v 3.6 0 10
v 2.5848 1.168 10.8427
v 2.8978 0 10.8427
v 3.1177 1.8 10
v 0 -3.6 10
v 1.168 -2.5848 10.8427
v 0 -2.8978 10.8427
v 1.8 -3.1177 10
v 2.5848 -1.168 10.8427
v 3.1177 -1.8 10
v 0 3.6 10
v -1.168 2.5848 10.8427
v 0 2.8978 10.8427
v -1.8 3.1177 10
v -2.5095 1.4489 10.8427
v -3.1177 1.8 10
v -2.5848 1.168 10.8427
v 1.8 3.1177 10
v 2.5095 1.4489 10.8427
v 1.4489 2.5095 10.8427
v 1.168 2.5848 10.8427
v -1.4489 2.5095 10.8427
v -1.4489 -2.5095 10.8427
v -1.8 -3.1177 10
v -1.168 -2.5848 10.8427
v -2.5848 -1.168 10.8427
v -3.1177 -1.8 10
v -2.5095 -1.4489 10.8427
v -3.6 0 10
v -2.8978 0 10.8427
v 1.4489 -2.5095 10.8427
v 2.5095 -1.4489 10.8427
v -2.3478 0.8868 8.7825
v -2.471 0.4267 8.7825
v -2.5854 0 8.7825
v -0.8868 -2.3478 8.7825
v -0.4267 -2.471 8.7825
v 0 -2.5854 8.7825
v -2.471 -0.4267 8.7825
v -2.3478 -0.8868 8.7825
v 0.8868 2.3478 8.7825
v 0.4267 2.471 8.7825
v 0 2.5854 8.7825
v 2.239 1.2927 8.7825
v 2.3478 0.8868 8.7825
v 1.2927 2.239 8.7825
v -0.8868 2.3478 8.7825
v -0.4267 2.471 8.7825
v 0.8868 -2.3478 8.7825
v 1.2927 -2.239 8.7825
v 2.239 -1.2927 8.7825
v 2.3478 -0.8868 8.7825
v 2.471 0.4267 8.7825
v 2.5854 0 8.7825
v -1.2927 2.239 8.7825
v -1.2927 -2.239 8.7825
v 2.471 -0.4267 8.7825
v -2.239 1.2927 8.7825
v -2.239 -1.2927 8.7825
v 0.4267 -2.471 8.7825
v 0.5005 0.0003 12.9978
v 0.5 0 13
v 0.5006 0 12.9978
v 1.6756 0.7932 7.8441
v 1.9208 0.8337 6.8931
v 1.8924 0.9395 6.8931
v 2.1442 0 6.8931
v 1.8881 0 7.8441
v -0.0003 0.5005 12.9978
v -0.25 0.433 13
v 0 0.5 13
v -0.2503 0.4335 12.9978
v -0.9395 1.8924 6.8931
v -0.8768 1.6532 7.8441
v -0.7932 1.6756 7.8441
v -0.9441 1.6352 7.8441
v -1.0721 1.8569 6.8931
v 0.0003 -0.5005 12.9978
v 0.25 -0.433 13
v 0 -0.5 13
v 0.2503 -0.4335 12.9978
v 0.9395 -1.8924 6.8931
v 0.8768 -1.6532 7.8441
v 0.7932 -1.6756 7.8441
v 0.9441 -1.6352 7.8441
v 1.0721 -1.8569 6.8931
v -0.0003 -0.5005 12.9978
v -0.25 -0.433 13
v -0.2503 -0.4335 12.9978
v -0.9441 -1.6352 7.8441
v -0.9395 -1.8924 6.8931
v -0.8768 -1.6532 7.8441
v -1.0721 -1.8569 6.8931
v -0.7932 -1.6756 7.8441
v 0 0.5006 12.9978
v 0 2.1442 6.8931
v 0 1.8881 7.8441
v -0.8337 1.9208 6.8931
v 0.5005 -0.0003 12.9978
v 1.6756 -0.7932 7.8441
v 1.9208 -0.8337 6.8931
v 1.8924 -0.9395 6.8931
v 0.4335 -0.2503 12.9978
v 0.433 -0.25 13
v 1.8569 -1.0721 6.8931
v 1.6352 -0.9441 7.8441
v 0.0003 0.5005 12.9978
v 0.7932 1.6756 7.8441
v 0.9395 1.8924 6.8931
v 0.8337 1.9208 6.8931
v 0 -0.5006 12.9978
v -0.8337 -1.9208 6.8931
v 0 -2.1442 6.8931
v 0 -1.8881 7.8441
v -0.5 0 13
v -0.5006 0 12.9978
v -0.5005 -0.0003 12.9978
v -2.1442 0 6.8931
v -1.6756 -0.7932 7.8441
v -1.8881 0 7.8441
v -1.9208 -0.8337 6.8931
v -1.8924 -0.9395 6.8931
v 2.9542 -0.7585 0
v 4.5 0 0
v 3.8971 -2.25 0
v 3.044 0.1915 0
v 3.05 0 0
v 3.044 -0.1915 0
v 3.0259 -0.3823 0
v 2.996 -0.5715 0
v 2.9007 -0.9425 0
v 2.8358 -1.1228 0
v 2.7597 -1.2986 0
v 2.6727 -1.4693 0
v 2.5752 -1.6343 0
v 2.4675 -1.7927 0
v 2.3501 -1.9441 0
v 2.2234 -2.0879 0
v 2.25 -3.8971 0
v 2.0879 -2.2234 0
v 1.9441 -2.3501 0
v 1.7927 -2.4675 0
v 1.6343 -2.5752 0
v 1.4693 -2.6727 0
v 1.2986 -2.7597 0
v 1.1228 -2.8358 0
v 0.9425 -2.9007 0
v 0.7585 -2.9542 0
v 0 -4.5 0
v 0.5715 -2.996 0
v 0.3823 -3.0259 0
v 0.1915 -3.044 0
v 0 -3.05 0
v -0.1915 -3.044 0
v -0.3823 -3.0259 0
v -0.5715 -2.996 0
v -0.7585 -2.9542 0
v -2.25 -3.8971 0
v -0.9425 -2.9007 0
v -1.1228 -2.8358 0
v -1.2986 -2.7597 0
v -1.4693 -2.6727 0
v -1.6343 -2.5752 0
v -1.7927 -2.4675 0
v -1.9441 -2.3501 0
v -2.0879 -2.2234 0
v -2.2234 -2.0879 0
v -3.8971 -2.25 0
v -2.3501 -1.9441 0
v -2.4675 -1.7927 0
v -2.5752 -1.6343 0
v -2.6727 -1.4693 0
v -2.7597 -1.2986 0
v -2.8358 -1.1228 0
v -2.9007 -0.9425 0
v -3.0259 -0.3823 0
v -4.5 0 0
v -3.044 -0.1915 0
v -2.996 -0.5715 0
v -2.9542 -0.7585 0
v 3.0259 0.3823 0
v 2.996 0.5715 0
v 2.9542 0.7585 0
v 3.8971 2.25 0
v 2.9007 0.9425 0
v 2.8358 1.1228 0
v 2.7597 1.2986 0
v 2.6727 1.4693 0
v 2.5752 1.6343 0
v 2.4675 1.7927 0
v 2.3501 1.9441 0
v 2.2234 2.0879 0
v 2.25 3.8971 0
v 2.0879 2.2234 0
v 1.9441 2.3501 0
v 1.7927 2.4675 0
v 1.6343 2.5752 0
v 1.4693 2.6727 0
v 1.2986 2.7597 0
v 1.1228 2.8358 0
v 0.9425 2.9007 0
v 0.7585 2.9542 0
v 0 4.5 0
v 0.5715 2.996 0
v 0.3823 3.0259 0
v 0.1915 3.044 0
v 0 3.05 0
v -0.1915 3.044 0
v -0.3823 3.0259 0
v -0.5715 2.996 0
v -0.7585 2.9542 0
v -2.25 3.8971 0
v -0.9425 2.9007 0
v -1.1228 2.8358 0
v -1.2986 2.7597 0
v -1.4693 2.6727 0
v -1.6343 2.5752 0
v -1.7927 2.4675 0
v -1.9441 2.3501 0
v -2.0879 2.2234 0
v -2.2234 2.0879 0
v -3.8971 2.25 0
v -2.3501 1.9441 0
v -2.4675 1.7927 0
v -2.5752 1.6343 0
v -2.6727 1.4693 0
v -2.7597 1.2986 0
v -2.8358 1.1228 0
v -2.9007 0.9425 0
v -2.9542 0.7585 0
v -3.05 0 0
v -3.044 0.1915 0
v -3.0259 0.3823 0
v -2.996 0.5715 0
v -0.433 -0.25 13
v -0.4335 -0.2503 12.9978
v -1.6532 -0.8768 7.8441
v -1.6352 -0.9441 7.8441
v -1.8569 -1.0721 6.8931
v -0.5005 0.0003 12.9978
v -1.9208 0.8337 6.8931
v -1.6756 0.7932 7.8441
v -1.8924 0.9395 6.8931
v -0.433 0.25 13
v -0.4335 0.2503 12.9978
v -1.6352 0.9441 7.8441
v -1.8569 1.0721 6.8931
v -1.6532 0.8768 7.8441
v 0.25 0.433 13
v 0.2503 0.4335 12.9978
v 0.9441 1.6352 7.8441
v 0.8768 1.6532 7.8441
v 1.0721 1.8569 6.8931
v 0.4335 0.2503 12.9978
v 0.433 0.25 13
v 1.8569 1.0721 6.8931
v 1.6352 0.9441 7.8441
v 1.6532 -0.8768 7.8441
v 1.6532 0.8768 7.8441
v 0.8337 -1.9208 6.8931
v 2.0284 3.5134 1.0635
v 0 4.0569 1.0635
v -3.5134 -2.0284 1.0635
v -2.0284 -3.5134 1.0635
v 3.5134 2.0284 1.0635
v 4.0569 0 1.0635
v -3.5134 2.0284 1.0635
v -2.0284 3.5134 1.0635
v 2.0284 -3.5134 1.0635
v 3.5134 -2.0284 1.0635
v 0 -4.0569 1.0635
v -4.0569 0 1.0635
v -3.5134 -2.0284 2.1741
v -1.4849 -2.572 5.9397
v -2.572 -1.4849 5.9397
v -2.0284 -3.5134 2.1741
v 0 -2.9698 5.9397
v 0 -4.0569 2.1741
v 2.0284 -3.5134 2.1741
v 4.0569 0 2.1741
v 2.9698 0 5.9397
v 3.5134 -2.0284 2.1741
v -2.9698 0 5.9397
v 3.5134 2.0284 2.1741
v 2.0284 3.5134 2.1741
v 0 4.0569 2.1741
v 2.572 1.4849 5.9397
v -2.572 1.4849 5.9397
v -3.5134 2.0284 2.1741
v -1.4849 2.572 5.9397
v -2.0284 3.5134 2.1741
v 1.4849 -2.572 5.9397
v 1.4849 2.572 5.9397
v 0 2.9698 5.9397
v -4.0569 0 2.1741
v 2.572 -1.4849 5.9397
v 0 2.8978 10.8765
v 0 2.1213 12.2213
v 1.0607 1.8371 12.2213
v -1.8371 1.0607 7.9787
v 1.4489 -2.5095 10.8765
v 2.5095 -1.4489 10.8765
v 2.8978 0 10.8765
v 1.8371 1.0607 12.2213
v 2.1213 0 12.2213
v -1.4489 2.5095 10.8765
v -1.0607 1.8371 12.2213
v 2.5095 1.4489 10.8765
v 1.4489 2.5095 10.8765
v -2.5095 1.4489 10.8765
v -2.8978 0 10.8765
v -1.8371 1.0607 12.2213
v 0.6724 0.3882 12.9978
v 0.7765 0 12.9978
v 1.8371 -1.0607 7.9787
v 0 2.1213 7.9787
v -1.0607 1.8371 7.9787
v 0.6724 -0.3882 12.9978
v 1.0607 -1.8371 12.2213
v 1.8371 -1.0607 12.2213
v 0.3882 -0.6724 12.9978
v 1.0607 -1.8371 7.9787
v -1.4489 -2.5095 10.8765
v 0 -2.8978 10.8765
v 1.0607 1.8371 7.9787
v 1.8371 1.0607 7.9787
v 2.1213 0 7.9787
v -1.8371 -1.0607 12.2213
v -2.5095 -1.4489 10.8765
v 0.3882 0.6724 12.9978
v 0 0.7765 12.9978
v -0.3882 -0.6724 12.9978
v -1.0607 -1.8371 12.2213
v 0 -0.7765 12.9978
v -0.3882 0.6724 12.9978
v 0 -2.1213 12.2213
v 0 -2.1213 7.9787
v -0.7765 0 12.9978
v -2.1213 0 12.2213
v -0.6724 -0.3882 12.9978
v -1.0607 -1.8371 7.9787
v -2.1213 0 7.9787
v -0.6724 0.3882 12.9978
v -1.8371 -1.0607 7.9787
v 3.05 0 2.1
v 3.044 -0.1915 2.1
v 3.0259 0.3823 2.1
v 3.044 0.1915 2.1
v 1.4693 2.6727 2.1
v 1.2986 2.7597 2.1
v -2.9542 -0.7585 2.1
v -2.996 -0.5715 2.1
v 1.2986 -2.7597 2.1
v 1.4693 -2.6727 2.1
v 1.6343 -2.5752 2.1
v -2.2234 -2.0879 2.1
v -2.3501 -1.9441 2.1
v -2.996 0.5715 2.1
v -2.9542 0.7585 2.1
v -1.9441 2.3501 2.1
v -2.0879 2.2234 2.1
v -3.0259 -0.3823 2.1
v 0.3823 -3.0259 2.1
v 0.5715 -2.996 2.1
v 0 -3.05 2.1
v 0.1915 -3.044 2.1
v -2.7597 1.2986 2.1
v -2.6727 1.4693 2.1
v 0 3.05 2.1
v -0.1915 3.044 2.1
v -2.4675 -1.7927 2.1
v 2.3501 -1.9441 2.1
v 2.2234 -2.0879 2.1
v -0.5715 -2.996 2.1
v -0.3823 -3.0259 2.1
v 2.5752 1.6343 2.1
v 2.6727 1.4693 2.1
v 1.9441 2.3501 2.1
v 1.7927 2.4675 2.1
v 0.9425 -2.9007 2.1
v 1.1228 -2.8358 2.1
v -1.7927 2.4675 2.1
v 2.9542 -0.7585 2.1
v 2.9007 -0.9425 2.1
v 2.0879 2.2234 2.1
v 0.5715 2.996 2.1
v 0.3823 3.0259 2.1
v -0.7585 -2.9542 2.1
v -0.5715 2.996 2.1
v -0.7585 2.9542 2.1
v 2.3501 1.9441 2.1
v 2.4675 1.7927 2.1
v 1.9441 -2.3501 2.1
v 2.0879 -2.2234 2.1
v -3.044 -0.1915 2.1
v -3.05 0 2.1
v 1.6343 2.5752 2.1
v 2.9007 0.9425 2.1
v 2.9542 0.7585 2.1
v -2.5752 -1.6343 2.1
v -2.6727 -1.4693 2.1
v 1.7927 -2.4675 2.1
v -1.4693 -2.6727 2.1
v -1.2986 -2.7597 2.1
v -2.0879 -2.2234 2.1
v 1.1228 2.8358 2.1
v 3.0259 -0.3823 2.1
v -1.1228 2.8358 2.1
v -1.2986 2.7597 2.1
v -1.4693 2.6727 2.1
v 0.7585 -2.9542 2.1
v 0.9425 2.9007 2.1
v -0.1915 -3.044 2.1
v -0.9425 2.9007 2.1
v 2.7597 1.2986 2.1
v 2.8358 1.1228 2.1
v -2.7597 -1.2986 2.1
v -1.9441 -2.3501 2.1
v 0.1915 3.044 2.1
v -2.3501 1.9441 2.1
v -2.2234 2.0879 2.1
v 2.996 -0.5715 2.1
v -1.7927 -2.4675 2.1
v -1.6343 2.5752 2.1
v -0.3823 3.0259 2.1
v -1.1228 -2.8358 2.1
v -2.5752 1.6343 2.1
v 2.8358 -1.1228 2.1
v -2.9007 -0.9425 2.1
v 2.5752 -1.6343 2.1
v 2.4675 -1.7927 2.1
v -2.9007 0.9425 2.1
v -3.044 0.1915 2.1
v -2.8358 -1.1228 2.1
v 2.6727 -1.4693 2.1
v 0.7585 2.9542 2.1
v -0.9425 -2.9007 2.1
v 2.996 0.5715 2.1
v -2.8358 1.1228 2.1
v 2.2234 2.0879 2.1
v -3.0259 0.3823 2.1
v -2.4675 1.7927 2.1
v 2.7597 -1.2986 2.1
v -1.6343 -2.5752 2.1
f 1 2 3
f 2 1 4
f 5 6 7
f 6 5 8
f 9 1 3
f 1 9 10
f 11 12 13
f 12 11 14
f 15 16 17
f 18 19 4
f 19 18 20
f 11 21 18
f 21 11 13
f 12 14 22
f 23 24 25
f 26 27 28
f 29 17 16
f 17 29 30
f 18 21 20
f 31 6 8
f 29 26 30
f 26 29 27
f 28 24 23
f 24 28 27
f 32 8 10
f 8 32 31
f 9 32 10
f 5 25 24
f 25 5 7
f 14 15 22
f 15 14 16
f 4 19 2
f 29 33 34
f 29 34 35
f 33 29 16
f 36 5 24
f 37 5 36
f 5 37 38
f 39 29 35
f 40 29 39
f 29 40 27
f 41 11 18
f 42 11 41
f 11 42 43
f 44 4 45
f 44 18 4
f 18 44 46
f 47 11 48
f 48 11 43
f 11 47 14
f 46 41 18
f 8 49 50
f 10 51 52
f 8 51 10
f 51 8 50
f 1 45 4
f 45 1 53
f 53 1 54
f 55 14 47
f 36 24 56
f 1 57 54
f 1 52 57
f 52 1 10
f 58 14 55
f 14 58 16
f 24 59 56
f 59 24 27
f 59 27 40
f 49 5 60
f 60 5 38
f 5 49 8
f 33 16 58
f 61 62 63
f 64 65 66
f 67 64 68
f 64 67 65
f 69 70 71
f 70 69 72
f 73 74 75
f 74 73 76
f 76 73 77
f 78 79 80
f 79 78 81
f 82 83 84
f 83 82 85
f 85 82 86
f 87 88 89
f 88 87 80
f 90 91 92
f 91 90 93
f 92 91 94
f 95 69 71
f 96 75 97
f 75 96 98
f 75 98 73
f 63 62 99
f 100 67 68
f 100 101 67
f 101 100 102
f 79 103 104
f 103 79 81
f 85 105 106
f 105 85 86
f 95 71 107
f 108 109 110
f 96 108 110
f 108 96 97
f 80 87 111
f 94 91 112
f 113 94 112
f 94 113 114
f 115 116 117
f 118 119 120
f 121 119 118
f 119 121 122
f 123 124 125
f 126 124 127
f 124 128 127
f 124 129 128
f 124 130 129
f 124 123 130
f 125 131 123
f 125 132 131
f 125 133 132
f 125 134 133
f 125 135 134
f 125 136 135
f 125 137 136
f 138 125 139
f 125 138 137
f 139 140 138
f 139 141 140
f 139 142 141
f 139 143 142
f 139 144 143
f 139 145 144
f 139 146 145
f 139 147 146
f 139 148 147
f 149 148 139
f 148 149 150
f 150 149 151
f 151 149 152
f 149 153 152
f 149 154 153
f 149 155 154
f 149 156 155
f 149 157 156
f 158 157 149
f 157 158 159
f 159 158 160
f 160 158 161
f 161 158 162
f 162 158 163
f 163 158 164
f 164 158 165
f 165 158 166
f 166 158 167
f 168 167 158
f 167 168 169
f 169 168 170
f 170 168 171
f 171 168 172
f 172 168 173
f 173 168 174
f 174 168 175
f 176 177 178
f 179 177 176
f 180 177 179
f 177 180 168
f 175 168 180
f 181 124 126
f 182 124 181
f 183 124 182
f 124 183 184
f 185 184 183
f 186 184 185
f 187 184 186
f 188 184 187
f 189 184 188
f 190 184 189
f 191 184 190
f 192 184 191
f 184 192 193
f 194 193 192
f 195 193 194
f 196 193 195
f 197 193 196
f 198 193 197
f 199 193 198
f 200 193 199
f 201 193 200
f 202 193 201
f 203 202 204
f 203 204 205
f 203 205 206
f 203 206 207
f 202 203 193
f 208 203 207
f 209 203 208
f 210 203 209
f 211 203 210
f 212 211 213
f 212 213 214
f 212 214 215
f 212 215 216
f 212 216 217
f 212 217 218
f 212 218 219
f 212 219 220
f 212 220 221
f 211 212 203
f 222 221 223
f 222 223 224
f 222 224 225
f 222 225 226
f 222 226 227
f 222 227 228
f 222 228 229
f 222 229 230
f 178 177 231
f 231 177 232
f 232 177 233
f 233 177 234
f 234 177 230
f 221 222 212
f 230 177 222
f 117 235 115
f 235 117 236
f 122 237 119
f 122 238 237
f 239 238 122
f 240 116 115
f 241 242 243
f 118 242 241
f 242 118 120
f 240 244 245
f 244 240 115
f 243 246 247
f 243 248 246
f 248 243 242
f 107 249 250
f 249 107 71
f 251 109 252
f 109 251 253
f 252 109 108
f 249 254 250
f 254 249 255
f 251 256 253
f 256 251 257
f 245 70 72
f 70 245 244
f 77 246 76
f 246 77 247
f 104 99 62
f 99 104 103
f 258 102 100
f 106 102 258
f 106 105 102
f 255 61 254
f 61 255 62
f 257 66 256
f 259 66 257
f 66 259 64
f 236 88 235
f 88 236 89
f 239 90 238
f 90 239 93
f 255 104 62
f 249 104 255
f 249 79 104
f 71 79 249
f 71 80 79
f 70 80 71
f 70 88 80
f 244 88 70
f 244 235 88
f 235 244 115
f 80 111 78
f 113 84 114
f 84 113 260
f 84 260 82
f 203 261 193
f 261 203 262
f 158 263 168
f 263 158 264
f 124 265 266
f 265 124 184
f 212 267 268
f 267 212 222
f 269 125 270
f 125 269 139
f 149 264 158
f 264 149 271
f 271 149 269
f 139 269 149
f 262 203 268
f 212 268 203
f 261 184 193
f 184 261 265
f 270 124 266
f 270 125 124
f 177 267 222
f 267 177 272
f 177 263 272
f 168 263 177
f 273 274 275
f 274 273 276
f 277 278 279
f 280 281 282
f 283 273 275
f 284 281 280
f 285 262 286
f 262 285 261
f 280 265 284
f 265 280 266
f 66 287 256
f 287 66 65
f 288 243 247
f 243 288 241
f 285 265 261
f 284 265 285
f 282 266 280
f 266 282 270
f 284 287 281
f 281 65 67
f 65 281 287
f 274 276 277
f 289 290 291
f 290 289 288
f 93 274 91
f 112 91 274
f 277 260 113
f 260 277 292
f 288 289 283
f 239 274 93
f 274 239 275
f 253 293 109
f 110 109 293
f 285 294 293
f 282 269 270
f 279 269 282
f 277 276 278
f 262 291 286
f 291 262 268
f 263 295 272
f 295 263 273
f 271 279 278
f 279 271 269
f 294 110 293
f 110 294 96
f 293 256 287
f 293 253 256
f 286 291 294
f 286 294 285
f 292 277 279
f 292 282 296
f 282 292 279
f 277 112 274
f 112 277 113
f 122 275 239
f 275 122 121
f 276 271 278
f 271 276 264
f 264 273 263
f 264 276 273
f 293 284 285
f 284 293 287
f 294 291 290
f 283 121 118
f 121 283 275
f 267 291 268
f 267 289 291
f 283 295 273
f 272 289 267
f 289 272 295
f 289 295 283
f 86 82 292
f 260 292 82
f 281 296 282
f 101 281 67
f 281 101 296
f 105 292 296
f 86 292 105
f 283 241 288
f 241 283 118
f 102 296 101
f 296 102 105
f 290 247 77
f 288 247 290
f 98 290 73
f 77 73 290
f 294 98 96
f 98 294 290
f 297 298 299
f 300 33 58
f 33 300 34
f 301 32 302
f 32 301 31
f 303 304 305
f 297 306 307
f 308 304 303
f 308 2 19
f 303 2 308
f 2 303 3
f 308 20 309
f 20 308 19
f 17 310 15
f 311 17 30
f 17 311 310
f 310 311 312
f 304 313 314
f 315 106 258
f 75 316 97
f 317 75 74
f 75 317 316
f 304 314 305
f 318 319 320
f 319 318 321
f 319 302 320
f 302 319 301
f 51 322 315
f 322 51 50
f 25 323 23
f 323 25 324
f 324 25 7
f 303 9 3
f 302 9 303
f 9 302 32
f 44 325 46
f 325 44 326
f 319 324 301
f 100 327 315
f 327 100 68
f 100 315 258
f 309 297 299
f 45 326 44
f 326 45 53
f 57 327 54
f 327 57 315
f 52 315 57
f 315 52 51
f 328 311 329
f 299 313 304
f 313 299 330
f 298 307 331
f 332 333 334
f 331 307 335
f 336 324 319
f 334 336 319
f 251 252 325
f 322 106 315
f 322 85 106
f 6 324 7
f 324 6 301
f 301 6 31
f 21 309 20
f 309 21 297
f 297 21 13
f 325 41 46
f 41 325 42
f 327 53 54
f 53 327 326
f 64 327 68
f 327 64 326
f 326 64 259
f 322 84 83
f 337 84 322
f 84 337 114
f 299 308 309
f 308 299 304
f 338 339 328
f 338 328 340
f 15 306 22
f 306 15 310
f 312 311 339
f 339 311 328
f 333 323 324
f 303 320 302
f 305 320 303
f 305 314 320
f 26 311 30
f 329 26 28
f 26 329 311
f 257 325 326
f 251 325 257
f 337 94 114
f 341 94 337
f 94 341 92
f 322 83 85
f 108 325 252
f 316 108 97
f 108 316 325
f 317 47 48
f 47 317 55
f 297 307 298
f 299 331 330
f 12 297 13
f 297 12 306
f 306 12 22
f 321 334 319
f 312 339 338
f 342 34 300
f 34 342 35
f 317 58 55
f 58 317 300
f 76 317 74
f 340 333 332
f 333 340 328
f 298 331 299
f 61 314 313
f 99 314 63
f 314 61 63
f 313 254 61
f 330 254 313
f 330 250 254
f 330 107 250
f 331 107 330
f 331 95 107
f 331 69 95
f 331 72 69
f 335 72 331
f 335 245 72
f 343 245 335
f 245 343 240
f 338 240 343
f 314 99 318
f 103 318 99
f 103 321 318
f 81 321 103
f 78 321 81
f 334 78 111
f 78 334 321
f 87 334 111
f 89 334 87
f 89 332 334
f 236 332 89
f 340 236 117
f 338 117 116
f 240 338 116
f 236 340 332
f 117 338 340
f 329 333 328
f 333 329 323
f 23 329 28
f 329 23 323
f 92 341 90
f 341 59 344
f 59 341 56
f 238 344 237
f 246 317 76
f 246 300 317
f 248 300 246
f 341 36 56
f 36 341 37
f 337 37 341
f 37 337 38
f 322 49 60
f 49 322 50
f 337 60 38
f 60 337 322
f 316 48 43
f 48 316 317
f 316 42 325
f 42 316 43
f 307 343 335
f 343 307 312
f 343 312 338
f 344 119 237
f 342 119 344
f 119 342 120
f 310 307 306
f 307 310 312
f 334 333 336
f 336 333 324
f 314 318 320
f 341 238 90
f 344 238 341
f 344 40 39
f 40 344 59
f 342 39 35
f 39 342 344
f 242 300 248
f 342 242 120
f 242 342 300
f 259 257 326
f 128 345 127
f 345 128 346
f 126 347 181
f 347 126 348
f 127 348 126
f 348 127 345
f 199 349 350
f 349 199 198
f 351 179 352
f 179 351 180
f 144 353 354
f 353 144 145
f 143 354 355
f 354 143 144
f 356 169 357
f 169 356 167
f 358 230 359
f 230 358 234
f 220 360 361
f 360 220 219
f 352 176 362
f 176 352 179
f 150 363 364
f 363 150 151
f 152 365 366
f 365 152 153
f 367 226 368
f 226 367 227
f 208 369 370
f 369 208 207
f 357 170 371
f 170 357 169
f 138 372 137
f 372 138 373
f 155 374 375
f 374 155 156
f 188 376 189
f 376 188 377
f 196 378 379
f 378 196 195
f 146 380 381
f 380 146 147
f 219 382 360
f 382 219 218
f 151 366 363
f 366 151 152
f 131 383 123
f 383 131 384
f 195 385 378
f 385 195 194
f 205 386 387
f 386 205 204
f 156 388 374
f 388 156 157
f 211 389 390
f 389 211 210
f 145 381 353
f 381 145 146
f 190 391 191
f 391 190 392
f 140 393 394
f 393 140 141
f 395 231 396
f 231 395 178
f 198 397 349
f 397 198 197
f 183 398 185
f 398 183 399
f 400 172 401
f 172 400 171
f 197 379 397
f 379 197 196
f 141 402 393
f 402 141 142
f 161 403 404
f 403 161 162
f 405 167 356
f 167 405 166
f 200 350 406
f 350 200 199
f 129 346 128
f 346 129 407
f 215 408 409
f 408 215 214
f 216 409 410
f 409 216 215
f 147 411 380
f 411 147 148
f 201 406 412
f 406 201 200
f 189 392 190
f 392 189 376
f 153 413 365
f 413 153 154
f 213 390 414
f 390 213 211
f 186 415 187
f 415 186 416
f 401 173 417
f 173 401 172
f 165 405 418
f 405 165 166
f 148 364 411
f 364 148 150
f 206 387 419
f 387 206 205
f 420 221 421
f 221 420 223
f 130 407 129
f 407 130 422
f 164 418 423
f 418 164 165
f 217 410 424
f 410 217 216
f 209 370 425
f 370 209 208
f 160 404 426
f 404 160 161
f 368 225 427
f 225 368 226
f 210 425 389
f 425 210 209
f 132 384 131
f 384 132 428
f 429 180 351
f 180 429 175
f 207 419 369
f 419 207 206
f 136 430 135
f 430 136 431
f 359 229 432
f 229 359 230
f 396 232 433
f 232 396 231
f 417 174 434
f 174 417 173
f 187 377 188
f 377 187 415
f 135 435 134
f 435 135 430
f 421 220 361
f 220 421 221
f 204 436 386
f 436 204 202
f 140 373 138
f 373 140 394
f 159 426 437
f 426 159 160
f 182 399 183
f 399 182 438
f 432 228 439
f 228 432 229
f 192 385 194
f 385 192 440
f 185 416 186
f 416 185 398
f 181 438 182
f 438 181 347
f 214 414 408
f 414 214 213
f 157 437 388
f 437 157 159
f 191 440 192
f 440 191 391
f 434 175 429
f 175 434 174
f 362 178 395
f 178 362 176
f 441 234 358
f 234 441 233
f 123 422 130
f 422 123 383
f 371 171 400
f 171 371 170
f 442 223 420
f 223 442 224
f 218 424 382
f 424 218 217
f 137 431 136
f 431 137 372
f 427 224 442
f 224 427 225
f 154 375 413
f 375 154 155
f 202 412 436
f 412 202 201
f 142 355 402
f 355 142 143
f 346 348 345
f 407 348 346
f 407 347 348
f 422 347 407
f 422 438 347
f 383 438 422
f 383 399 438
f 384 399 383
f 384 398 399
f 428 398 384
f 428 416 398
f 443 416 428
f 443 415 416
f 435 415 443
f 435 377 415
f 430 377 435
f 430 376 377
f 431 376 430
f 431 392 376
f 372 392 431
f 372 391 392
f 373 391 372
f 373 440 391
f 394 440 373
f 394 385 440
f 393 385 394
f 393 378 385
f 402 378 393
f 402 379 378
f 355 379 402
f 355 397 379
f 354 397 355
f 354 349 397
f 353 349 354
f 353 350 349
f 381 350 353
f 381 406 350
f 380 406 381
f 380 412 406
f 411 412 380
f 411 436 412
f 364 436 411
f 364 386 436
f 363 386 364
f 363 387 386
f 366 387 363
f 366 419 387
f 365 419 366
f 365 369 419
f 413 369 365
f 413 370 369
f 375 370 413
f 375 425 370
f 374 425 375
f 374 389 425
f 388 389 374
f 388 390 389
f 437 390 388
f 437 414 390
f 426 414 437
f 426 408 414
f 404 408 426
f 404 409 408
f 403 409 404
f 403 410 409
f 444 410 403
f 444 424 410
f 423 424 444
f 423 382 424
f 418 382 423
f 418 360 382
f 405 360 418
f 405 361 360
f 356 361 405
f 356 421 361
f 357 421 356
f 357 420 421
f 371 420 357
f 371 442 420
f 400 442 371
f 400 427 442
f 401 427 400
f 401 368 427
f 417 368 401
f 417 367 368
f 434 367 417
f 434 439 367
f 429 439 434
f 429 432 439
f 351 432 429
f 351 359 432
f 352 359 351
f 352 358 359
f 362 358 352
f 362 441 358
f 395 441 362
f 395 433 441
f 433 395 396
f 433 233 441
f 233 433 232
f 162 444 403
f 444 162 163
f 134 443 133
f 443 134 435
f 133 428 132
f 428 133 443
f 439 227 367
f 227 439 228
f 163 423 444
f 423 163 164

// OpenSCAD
/*
Pawn Piece Generator
*/

// Parameters
$fn = 12; // Polygon detail (preview quality)

magnet_height = 2.1;       // Magnet height (mm)
magnet_radius = 3.05;      // Magnet radius (mm)

body_height = 13;          // Total body height
body_radius = 4.5;         // Base radius

neck_radius = 3;           // Neck/shoulder sphere radius
head_radius = 3;           // Head sphere radius

transparency = 5;          // Visual transparency
color_rgb = [143, 255, 61]; // RGB color

// Optional size bounds visualization
module bounds() {
    color("red", 0.3)
        cube([6, 1, 17]); // Width × Depth × Height
}

// Main model: Pawn figure
module pawn() {
    union() {
        color(color_rgb / 255, transparency) {

            // Body (slightly tapered)
            cylinder(h = body_height, r1 = body_radius - 0.5, r2 = body_radius - 4, center = false);

            // Base shoulder taper
            cylinder(h = 3.6, r1 = body_radius, r2 = body_radius - 1.5, center = false);

            // Midsection bulge (neck/torso)
            scale([1, 1, 2])
                sphere(r = 4.2);

            // Head
            translate([0, 0, body_height - 2.9])
                sphere(r = head_radius);

            // Helmet (tapered cone and mirrored copy)
            translate([0, 0, body_height - 3]) {
                scale([0.8, 0.8, 0.8])
                    cylinder(h = 3, r1 = 4.5, r2 = 2, center = false);

                rotate([0, 180, 0])
                    scale([0.8, 0.8, 0.8])
                        cylinder(h = 3, r1 = 4.5, r2 = 2, center = false);
            }
        }
    }
}

// Magnet cavity
module magnet_cavity() {
    offset = 0.5;
    translate([0, 0, -offset]) {
        color("yellow", transparency)
            cylinder(h = magnet_height + offset, r = magnet_radius, center = false, $fn = 100);
    }
}

// Negative base for cleanup (e.g., flush base when printing)
module bottom_cutout() {
    translate([-50, -50, -10])
        cube([100, 100, 10]);
}

// Final model with cutouts
difference() {
    pawn();
    magnet_cavity();
    bottom_cutout();
}
